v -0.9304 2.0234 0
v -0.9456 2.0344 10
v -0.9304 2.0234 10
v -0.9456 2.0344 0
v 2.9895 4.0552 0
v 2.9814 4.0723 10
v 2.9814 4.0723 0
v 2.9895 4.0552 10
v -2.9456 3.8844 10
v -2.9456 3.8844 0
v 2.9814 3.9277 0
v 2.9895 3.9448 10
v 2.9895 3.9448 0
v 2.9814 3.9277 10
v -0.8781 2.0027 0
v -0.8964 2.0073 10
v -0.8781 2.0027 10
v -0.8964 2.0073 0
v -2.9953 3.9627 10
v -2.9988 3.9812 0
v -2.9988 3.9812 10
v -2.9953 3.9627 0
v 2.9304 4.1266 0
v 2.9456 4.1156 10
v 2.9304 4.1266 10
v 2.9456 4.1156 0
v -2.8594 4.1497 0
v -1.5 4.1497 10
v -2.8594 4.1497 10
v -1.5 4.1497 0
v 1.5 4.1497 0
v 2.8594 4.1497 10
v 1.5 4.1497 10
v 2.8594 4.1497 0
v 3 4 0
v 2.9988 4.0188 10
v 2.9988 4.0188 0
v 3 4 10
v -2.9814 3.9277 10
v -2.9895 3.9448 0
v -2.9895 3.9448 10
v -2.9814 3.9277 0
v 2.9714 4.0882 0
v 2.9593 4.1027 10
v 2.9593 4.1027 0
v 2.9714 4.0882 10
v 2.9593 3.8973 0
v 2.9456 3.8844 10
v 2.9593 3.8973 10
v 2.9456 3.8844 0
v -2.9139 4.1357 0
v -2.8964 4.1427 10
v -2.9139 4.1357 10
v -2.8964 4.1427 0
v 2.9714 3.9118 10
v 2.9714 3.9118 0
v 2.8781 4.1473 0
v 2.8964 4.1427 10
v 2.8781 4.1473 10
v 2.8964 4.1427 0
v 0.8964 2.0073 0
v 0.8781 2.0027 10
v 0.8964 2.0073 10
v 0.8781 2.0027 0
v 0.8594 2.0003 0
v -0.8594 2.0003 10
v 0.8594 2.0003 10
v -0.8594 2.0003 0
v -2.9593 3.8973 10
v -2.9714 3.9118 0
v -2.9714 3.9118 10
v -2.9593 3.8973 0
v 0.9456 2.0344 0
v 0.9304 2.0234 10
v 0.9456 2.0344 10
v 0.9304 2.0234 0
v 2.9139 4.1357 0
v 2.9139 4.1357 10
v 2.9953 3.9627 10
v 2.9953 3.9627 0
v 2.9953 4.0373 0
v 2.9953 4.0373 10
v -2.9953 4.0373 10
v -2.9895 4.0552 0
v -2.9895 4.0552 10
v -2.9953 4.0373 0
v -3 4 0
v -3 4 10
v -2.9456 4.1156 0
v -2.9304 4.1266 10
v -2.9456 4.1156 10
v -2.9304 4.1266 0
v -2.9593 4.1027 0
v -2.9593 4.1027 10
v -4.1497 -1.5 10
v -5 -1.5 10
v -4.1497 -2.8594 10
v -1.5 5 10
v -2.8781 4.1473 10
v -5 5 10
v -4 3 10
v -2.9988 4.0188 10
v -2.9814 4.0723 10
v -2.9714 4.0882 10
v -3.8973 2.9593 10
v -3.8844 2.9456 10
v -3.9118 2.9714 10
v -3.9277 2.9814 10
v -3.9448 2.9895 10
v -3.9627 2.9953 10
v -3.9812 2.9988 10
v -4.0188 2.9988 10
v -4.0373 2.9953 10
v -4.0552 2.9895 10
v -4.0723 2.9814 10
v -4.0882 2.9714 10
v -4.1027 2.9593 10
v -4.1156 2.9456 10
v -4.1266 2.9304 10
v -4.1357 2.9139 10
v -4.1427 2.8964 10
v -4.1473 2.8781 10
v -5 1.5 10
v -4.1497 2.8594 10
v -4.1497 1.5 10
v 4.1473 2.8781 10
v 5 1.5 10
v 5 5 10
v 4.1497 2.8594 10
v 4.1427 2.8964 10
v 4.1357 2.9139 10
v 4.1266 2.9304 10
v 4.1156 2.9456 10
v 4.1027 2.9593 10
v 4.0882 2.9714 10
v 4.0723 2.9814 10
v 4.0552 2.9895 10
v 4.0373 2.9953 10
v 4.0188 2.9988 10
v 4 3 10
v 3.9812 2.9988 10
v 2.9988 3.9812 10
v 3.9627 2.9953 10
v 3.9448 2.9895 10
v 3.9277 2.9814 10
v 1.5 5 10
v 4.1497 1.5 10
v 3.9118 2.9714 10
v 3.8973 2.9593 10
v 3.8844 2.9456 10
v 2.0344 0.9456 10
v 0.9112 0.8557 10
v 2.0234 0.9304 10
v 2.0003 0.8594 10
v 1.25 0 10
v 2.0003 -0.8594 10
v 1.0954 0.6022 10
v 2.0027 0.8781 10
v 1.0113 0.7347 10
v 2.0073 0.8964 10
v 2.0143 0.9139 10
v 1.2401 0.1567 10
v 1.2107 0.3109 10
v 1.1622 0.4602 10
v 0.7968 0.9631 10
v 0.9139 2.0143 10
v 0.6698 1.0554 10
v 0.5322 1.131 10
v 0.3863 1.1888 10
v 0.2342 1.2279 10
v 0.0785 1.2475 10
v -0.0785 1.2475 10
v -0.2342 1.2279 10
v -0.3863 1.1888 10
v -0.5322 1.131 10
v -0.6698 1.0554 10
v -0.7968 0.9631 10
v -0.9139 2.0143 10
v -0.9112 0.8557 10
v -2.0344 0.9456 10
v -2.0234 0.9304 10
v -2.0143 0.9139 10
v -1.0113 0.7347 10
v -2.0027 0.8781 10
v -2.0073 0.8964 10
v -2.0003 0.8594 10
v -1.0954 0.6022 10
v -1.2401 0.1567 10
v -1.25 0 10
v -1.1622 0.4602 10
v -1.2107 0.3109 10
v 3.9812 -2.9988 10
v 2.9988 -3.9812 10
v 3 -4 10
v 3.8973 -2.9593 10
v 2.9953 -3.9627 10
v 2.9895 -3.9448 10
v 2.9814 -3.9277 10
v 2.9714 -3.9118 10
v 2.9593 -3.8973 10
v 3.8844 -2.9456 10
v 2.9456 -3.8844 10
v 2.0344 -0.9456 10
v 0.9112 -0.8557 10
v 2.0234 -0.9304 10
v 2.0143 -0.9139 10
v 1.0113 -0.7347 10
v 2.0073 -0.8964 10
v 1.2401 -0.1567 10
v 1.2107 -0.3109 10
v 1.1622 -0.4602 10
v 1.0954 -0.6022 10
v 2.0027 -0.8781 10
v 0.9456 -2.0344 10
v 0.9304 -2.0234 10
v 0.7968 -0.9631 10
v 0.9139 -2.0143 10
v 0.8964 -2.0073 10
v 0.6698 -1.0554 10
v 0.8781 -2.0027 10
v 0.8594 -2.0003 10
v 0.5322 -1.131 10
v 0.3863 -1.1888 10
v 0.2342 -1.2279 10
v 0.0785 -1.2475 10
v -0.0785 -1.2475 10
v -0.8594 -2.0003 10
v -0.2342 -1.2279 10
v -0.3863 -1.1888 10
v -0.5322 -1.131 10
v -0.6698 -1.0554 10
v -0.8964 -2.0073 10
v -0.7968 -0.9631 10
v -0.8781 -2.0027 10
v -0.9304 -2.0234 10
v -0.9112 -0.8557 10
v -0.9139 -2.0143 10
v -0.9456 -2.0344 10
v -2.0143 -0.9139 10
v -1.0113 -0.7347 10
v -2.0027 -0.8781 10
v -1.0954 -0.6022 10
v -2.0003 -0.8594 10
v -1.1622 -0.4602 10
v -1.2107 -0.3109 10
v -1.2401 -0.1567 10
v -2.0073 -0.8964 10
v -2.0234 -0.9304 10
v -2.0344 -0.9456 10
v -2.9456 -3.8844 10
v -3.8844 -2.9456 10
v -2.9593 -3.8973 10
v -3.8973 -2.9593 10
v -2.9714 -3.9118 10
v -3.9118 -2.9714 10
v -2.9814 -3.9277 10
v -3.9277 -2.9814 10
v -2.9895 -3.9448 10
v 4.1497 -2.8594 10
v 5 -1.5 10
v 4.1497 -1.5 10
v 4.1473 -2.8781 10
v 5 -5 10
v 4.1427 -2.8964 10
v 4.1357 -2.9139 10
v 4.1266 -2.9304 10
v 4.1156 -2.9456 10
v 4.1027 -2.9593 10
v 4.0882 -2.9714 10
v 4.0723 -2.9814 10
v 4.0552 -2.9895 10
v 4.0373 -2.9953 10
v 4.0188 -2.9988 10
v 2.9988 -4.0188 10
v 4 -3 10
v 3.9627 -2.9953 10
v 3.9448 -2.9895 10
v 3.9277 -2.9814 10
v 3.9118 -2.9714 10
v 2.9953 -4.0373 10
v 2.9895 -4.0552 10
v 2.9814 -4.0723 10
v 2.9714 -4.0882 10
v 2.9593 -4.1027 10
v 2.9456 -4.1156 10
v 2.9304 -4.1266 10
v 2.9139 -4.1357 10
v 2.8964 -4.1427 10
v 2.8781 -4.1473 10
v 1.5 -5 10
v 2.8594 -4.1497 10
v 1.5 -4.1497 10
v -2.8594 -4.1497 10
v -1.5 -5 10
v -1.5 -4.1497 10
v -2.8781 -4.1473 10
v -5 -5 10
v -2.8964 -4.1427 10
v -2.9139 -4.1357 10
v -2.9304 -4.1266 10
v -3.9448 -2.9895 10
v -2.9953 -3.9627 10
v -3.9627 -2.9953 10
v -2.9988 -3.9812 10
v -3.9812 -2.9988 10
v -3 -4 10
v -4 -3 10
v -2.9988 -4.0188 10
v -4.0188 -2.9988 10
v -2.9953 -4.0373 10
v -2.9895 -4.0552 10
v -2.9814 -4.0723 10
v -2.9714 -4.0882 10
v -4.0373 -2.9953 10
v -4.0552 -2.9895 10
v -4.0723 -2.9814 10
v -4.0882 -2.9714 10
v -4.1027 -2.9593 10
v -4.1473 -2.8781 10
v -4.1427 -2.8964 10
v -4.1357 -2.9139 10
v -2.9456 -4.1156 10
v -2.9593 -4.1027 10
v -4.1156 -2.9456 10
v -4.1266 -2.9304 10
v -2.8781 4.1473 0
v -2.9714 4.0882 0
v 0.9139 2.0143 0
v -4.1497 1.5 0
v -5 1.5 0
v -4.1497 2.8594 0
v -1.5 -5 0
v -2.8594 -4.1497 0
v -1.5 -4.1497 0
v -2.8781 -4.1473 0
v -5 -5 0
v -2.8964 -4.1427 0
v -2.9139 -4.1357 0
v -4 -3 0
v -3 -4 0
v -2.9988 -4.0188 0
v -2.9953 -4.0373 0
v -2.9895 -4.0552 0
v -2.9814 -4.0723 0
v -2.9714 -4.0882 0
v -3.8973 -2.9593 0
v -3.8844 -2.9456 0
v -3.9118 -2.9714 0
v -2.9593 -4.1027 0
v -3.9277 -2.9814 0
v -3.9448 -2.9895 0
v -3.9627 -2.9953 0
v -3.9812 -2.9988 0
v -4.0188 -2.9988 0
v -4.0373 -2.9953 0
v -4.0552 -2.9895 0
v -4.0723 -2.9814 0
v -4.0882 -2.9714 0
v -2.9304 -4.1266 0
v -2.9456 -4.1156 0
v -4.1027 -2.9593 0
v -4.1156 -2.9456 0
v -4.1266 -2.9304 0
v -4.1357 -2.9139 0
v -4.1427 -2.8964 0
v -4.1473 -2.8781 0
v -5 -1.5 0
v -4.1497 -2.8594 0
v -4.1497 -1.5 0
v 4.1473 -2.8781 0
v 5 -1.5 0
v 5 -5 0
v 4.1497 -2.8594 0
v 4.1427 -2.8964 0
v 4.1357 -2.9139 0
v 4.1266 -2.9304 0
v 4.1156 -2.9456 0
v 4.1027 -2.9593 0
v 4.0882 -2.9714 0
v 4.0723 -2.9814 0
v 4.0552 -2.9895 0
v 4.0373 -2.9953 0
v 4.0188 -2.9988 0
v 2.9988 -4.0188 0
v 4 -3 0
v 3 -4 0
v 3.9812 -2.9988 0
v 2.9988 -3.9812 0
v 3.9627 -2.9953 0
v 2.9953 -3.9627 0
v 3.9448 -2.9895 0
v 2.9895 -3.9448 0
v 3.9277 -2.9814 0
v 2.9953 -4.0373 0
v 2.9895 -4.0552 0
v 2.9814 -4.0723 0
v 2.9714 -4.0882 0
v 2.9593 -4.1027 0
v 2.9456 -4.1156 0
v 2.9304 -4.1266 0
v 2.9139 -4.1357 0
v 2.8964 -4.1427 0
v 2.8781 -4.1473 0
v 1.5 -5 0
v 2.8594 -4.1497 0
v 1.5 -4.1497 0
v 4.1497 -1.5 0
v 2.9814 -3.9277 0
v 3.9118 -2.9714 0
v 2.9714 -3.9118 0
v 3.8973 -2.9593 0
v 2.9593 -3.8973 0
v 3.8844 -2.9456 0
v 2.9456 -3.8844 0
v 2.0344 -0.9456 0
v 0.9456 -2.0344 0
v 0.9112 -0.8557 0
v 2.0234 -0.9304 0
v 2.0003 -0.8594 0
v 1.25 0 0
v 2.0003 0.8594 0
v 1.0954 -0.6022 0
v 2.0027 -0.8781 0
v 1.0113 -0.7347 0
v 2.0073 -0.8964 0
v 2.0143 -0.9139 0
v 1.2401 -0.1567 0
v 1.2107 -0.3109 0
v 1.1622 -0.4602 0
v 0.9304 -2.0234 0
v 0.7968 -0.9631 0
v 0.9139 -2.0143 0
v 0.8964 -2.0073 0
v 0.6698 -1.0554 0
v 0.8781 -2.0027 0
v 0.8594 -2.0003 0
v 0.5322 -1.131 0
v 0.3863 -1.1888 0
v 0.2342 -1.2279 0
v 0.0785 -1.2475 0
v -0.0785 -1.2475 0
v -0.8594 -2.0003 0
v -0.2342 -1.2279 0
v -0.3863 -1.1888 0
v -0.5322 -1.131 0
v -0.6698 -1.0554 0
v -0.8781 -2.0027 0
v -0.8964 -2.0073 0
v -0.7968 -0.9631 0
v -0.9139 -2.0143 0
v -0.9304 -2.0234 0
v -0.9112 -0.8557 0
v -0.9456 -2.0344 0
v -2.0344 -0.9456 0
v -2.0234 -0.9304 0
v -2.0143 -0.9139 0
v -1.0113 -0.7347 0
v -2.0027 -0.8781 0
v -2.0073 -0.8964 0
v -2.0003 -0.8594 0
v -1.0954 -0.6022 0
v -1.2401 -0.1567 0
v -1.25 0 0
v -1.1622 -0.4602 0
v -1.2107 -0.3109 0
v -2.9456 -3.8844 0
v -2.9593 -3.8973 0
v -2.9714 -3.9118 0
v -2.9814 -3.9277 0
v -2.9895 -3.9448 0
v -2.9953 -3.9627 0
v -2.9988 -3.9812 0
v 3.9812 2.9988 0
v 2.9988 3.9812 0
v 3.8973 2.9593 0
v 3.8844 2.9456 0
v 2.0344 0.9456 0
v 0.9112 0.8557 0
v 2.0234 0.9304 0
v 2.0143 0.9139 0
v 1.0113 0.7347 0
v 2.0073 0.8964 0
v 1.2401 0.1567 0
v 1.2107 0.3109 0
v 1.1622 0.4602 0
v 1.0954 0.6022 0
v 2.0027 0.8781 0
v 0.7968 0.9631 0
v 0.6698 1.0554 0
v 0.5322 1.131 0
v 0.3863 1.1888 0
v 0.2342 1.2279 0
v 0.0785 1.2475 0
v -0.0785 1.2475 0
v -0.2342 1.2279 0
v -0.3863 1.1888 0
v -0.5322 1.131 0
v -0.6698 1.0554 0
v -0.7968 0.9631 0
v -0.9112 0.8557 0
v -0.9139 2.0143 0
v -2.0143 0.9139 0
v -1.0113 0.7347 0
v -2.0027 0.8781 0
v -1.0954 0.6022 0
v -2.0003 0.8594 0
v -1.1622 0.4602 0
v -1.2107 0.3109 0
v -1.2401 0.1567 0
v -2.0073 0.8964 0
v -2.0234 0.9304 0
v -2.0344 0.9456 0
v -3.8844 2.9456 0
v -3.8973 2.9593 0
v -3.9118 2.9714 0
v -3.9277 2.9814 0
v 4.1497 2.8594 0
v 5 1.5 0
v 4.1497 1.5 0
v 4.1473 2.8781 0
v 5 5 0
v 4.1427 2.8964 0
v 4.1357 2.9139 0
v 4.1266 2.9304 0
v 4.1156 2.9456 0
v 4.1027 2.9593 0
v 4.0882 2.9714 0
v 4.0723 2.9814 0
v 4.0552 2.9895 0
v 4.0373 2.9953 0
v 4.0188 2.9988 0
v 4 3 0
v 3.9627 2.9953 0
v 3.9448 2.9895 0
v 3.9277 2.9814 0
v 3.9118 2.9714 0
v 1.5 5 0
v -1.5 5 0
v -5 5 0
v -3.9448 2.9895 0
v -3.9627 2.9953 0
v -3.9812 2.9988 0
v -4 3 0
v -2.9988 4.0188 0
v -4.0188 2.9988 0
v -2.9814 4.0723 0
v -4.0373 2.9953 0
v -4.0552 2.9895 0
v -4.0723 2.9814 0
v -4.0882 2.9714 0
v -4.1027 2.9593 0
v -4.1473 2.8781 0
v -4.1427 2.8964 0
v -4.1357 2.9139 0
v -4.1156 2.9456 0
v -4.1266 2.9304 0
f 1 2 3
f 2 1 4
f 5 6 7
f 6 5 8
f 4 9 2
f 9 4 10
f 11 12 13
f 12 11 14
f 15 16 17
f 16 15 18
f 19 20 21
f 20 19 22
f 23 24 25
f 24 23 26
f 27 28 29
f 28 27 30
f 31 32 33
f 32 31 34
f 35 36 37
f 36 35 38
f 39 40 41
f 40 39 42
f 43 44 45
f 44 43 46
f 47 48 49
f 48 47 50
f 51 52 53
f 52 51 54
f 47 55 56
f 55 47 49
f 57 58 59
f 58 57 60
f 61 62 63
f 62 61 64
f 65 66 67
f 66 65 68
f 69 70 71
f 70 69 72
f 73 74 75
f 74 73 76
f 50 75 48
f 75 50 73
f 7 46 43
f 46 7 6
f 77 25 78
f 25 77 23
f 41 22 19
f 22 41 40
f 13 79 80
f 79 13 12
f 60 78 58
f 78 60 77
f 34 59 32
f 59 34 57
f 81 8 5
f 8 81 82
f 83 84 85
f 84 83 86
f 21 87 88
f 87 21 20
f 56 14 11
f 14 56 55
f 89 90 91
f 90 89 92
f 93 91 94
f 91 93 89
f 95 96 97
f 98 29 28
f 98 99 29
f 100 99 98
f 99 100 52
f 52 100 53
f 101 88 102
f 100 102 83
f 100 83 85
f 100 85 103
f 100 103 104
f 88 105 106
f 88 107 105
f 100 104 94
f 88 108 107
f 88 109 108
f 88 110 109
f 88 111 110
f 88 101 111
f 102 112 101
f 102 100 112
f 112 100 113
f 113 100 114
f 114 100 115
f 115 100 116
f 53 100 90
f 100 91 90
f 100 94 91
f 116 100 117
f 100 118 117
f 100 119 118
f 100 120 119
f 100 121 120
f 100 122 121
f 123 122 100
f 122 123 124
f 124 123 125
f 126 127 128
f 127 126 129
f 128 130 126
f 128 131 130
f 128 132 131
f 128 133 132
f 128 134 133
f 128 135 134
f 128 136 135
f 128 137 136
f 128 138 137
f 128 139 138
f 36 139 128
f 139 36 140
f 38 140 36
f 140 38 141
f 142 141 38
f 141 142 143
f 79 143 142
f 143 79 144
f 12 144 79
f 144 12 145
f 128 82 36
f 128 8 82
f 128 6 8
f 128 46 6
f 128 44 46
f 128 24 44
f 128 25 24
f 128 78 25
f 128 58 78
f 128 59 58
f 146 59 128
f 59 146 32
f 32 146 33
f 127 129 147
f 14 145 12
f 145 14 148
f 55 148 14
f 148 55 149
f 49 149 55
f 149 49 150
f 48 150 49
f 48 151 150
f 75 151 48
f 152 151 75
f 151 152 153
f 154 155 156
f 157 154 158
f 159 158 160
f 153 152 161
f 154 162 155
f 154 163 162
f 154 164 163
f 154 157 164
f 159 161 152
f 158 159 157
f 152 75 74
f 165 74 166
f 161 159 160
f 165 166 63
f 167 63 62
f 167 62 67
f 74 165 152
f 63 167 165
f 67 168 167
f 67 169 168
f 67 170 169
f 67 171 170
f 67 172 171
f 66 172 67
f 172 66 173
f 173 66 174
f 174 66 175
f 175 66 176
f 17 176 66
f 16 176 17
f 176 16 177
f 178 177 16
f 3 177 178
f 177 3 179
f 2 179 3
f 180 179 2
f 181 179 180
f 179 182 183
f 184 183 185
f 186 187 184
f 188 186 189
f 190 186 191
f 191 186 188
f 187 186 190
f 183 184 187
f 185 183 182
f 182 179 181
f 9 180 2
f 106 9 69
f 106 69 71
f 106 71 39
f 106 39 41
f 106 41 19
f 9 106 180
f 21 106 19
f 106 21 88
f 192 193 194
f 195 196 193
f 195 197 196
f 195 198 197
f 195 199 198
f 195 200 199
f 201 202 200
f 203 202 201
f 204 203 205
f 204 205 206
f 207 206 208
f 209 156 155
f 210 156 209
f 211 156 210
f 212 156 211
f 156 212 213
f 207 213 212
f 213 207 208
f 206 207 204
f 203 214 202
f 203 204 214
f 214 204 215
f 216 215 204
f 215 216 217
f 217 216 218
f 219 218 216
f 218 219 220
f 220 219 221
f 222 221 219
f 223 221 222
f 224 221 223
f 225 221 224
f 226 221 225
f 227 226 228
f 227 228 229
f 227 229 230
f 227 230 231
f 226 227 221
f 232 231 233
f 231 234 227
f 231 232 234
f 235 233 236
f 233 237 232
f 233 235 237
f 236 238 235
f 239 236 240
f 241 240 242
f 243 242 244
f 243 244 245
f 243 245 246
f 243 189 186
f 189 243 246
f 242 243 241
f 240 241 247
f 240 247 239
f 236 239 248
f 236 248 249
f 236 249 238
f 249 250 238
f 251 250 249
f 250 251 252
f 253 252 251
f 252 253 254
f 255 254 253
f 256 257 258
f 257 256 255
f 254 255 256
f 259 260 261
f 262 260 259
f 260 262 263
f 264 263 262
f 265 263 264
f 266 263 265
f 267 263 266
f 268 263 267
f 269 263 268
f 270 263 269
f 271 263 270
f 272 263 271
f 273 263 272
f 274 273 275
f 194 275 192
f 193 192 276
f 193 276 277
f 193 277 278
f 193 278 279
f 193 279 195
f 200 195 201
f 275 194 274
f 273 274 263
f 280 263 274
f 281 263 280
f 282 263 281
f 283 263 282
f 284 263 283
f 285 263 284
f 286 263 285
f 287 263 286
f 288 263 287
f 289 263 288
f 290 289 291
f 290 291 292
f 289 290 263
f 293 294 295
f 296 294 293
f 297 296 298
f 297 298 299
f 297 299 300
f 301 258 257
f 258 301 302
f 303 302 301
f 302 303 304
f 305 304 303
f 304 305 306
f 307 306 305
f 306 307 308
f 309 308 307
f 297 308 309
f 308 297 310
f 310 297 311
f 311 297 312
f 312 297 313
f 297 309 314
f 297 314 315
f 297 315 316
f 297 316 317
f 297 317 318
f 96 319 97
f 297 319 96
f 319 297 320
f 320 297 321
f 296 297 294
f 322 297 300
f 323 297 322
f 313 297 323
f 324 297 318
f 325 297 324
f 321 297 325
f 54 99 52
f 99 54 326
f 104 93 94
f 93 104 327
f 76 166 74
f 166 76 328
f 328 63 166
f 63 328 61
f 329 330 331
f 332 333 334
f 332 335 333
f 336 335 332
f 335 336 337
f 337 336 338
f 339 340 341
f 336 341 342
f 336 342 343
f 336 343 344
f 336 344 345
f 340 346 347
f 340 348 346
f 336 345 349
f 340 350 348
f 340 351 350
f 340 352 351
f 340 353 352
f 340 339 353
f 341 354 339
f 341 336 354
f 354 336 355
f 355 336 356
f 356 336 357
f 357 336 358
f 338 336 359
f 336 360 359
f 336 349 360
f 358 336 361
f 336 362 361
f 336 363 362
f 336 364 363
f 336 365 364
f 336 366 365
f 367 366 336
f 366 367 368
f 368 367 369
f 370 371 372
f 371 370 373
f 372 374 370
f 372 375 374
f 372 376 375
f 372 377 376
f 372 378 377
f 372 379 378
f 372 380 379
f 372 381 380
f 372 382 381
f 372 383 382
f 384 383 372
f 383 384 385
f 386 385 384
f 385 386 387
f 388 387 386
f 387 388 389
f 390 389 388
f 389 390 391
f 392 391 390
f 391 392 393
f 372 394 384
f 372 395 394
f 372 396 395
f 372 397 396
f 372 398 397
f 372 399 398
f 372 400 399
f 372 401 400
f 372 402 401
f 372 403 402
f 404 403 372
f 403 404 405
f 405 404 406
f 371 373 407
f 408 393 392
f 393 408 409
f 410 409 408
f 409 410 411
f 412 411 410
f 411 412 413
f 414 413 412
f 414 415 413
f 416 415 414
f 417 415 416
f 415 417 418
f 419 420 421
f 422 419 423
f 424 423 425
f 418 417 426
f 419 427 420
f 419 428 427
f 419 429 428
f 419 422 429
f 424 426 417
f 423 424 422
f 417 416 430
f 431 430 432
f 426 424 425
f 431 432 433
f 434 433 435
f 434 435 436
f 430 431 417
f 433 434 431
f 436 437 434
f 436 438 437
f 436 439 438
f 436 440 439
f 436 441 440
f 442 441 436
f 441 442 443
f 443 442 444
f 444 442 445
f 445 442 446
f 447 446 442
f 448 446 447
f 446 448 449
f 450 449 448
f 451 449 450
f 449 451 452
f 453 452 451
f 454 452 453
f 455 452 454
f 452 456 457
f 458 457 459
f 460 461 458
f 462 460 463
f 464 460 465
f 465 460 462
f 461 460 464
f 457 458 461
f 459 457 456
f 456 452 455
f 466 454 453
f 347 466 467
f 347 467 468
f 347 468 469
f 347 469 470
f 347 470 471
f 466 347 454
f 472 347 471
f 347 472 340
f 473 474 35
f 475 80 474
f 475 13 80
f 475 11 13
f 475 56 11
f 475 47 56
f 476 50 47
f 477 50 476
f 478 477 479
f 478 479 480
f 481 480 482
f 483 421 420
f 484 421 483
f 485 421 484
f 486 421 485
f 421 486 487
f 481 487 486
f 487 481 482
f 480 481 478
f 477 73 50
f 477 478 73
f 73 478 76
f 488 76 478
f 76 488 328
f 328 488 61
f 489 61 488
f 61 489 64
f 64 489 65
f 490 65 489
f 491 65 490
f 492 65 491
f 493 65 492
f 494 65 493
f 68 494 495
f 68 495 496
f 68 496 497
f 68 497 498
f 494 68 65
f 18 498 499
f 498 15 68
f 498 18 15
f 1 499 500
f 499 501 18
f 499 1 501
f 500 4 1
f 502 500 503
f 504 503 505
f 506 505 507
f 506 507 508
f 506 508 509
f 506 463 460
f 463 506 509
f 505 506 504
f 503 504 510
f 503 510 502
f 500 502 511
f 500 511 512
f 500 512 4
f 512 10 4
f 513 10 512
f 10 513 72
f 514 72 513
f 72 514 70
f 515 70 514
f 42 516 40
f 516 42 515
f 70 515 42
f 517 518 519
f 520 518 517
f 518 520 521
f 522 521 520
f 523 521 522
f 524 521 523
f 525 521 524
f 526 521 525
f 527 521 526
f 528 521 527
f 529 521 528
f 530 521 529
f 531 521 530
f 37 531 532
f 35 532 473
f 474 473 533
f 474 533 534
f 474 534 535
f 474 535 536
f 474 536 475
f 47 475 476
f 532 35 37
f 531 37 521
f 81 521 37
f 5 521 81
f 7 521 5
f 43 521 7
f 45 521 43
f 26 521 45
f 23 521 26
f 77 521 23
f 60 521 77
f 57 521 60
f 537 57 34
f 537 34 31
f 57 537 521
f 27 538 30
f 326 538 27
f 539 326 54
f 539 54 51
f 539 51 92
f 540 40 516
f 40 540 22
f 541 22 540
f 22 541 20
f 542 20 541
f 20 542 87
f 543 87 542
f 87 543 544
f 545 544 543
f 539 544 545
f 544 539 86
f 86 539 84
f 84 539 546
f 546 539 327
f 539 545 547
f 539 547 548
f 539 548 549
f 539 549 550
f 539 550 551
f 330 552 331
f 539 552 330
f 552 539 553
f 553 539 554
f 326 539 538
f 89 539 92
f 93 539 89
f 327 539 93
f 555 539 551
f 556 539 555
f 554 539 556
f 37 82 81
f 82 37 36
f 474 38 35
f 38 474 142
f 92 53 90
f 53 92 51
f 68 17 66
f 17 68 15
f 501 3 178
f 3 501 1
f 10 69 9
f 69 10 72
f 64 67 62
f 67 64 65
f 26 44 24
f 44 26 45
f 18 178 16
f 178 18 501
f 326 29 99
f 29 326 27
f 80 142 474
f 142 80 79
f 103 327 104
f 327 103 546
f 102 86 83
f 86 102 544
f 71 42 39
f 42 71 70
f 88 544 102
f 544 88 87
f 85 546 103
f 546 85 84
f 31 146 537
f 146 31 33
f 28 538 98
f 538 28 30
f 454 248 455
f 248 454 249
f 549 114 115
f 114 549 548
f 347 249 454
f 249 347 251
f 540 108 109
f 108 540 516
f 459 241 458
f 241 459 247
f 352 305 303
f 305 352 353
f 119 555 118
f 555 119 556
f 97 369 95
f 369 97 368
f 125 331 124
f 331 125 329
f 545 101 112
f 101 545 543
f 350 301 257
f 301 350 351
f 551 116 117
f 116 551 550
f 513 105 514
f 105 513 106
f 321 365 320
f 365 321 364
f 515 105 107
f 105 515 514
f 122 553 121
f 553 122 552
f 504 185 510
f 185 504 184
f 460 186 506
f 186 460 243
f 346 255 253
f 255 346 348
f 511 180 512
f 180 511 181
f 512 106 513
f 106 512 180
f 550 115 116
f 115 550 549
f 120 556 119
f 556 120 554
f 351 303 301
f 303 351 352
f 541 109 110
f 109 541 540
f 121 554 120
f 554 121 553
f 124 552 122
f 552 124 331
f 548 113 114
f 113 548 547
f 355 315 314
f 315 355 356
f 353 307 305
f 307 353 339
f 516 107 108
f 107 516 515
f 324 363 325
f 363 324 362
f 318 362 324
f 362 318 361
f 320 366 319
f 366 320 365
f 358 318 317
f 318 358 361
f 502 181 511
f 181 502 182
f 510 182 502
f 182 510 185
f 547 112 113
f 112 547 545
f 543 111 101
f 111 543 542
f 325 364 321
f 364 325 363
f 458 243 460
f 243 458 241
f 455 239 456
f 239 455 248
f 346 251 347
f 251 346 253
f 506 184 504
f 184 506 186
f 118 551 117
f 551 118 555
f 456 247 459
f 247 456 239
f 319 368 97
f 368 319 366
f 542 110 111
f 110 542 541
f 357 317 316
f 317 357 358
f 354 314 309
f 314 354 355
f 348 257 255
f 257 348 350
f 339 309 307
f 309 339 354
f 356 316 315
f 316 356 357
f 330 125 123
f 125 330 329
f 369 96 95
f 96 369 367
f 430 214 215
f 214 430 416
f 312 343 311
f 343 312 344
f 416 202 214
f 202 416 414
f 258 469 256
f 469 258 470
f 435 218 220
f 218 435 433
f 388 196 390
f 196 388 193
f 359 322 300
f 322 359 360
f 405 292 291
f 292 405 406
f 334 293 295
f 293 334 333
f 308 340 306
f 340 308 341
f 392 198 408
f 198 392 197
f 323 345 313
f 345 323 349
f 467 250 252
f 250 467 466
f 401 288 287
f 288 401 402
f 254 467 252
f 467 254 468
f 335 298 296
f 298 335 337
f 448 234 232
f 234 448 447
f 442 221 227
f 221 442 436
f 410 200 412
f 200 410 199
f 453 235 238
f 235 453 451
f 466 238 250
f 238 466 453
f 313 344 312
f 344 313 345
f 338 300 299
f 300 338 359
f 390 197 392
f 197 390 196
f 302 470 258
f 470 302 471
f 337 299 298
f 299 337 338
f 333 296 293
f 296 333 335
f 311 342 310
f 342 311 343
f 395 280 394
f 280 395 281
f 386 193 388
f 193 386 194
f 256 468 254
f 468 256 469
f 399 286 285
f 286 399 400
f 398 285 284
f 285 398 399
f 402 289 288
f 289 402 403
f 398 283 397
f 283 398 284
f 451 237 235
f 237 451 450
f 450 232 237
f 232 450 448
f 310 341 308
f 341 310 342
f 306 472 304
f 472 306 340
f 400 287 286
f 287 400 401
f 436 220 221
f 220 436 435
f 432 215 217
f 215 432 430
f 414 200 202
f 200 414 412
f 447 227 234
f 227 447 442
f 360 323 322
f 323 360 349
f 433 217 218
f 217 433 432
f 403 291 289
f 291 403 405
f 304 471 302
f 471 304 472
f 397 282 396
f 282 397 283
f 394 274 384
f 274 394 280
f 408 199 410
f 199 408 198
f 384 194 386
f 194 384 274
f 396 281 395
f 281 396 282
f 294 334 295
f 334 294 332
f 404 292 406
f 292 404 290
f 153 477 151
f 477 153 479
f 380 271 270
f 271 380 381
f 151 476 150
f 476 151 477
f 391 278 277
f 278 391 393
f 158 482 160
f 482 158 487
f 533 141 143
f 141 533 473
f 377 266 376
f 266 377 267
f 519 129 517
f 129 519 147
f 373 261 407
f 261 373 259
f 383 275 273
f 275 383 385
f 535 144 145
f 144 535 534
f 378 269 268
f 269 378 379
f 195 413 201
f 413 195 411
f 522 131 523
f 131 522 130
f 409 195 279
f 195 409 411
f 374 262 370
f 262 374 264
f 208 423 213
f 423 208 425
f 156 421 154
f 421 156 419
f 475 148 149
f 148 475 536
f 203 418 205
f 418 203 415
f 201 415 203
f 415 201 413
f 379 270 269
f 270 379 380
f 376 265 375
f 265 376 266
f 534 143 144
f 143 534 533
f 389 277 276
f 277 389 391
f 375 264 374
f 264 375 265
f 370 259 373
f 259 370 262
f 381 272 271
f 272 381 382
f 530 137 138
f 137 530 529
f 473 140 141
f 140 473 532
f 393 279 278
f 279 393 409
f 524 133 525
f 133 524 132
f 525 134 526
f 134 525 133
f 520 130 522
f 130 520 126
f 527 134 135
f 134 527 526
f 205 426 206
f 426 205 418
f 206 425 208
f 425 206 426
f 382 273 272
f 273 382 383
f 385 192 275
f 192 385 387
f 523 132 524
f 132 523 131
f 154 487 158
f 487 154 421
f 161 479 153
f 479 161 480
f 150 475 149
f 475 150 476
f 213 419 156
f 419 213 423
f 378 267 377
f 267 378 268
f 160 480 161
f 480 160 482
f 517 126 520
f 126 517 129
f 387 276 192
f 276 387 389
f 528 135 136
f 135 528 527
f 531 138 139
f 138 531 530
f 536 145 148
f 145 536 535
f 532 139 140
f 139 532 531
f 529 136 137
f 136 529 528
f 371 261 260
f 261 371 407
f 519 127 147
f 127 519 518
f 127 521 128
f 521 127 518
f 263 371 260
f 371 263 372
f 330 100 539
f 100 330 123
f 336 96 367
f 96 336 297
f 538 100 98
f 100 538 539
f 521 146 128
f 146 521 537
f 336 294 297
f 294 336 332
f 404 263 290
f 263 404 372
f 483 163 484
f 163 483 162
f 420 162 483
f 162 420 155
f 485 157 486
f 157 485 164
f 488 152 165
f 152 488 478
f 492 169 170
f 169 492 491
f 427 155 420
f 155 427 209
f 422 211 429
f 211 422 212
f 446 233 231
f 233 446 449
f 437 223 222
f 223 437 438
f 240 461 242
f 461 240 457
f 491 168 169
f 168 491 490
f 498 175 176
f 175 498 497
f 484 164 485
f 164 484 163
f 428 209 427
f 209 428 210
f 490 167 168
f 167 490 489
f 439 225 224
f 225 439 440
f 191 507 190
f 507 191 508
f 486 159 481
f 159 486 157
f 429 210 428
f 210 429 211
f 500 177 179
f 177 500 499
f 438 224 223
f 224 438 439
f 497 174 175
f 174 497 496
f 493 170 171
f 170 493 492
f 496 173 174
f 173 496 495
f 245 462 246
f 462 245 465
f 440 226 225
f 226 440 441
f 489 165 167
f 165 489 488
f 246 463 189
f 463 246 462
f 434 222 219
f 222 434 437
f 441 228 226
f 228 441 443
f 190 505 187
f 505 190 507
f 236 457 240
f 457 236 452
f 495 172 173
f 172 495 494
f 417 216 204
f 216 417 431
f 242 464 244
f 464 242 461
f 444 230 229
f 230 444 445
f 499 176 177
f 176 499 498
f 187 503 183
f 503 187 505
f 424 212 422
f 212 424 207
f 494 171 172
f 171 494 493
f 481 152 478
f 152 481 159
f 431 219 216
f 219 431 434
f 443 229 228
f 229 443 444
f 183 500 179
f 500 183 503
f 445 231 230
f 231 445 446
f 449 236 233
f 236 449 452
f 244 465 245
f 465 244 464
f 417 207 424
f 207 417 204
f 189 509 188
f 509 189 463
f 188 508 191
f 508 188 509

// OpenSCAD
// cube([10, 10, 1], center=true);

$fn = 50;

module slot(l) {
	minkowski() {
		polyhedron(points=[[-0.85, 0, 0],
						   [0.85, 0, 0],
						   [-2.85, 1.85, 0],
						   [2.85, 1.85, 0],
						   [-0.85, 0, l/2],
						   [0.85, 0, l/2],
						   [-2.85, 1.85, l/2],
						   [2.85, 1.85, l/2]],
				   faces=[[0, 1, 3, 2],
				   		  [6, 7, 5, 4],
				   		  [4, 5, 1, 0],
				   		  [5, 7, 3, 1],
				   		  [2, 3, 7, 6],
				   		  [4, 0, 2, 6]]);
		translate([0, 0.15, 0]) cylinder(h=l/2, r=0.15);
	}
	translate([-1.5, 2, 0]) cube([3, 1.1, l]);
}

module makerbeam(l) {
	difference() {
		translate([0, 0, l/2]) cube([10, 10, l], center=true);
		for (i = [0:3]) {
			rotate([0, 0, 90 * i]) translate([0, 2, 0]) slot(l);
		}
		cylinder(h=l, r=1.25);
	}
}

makerbeam(10);
